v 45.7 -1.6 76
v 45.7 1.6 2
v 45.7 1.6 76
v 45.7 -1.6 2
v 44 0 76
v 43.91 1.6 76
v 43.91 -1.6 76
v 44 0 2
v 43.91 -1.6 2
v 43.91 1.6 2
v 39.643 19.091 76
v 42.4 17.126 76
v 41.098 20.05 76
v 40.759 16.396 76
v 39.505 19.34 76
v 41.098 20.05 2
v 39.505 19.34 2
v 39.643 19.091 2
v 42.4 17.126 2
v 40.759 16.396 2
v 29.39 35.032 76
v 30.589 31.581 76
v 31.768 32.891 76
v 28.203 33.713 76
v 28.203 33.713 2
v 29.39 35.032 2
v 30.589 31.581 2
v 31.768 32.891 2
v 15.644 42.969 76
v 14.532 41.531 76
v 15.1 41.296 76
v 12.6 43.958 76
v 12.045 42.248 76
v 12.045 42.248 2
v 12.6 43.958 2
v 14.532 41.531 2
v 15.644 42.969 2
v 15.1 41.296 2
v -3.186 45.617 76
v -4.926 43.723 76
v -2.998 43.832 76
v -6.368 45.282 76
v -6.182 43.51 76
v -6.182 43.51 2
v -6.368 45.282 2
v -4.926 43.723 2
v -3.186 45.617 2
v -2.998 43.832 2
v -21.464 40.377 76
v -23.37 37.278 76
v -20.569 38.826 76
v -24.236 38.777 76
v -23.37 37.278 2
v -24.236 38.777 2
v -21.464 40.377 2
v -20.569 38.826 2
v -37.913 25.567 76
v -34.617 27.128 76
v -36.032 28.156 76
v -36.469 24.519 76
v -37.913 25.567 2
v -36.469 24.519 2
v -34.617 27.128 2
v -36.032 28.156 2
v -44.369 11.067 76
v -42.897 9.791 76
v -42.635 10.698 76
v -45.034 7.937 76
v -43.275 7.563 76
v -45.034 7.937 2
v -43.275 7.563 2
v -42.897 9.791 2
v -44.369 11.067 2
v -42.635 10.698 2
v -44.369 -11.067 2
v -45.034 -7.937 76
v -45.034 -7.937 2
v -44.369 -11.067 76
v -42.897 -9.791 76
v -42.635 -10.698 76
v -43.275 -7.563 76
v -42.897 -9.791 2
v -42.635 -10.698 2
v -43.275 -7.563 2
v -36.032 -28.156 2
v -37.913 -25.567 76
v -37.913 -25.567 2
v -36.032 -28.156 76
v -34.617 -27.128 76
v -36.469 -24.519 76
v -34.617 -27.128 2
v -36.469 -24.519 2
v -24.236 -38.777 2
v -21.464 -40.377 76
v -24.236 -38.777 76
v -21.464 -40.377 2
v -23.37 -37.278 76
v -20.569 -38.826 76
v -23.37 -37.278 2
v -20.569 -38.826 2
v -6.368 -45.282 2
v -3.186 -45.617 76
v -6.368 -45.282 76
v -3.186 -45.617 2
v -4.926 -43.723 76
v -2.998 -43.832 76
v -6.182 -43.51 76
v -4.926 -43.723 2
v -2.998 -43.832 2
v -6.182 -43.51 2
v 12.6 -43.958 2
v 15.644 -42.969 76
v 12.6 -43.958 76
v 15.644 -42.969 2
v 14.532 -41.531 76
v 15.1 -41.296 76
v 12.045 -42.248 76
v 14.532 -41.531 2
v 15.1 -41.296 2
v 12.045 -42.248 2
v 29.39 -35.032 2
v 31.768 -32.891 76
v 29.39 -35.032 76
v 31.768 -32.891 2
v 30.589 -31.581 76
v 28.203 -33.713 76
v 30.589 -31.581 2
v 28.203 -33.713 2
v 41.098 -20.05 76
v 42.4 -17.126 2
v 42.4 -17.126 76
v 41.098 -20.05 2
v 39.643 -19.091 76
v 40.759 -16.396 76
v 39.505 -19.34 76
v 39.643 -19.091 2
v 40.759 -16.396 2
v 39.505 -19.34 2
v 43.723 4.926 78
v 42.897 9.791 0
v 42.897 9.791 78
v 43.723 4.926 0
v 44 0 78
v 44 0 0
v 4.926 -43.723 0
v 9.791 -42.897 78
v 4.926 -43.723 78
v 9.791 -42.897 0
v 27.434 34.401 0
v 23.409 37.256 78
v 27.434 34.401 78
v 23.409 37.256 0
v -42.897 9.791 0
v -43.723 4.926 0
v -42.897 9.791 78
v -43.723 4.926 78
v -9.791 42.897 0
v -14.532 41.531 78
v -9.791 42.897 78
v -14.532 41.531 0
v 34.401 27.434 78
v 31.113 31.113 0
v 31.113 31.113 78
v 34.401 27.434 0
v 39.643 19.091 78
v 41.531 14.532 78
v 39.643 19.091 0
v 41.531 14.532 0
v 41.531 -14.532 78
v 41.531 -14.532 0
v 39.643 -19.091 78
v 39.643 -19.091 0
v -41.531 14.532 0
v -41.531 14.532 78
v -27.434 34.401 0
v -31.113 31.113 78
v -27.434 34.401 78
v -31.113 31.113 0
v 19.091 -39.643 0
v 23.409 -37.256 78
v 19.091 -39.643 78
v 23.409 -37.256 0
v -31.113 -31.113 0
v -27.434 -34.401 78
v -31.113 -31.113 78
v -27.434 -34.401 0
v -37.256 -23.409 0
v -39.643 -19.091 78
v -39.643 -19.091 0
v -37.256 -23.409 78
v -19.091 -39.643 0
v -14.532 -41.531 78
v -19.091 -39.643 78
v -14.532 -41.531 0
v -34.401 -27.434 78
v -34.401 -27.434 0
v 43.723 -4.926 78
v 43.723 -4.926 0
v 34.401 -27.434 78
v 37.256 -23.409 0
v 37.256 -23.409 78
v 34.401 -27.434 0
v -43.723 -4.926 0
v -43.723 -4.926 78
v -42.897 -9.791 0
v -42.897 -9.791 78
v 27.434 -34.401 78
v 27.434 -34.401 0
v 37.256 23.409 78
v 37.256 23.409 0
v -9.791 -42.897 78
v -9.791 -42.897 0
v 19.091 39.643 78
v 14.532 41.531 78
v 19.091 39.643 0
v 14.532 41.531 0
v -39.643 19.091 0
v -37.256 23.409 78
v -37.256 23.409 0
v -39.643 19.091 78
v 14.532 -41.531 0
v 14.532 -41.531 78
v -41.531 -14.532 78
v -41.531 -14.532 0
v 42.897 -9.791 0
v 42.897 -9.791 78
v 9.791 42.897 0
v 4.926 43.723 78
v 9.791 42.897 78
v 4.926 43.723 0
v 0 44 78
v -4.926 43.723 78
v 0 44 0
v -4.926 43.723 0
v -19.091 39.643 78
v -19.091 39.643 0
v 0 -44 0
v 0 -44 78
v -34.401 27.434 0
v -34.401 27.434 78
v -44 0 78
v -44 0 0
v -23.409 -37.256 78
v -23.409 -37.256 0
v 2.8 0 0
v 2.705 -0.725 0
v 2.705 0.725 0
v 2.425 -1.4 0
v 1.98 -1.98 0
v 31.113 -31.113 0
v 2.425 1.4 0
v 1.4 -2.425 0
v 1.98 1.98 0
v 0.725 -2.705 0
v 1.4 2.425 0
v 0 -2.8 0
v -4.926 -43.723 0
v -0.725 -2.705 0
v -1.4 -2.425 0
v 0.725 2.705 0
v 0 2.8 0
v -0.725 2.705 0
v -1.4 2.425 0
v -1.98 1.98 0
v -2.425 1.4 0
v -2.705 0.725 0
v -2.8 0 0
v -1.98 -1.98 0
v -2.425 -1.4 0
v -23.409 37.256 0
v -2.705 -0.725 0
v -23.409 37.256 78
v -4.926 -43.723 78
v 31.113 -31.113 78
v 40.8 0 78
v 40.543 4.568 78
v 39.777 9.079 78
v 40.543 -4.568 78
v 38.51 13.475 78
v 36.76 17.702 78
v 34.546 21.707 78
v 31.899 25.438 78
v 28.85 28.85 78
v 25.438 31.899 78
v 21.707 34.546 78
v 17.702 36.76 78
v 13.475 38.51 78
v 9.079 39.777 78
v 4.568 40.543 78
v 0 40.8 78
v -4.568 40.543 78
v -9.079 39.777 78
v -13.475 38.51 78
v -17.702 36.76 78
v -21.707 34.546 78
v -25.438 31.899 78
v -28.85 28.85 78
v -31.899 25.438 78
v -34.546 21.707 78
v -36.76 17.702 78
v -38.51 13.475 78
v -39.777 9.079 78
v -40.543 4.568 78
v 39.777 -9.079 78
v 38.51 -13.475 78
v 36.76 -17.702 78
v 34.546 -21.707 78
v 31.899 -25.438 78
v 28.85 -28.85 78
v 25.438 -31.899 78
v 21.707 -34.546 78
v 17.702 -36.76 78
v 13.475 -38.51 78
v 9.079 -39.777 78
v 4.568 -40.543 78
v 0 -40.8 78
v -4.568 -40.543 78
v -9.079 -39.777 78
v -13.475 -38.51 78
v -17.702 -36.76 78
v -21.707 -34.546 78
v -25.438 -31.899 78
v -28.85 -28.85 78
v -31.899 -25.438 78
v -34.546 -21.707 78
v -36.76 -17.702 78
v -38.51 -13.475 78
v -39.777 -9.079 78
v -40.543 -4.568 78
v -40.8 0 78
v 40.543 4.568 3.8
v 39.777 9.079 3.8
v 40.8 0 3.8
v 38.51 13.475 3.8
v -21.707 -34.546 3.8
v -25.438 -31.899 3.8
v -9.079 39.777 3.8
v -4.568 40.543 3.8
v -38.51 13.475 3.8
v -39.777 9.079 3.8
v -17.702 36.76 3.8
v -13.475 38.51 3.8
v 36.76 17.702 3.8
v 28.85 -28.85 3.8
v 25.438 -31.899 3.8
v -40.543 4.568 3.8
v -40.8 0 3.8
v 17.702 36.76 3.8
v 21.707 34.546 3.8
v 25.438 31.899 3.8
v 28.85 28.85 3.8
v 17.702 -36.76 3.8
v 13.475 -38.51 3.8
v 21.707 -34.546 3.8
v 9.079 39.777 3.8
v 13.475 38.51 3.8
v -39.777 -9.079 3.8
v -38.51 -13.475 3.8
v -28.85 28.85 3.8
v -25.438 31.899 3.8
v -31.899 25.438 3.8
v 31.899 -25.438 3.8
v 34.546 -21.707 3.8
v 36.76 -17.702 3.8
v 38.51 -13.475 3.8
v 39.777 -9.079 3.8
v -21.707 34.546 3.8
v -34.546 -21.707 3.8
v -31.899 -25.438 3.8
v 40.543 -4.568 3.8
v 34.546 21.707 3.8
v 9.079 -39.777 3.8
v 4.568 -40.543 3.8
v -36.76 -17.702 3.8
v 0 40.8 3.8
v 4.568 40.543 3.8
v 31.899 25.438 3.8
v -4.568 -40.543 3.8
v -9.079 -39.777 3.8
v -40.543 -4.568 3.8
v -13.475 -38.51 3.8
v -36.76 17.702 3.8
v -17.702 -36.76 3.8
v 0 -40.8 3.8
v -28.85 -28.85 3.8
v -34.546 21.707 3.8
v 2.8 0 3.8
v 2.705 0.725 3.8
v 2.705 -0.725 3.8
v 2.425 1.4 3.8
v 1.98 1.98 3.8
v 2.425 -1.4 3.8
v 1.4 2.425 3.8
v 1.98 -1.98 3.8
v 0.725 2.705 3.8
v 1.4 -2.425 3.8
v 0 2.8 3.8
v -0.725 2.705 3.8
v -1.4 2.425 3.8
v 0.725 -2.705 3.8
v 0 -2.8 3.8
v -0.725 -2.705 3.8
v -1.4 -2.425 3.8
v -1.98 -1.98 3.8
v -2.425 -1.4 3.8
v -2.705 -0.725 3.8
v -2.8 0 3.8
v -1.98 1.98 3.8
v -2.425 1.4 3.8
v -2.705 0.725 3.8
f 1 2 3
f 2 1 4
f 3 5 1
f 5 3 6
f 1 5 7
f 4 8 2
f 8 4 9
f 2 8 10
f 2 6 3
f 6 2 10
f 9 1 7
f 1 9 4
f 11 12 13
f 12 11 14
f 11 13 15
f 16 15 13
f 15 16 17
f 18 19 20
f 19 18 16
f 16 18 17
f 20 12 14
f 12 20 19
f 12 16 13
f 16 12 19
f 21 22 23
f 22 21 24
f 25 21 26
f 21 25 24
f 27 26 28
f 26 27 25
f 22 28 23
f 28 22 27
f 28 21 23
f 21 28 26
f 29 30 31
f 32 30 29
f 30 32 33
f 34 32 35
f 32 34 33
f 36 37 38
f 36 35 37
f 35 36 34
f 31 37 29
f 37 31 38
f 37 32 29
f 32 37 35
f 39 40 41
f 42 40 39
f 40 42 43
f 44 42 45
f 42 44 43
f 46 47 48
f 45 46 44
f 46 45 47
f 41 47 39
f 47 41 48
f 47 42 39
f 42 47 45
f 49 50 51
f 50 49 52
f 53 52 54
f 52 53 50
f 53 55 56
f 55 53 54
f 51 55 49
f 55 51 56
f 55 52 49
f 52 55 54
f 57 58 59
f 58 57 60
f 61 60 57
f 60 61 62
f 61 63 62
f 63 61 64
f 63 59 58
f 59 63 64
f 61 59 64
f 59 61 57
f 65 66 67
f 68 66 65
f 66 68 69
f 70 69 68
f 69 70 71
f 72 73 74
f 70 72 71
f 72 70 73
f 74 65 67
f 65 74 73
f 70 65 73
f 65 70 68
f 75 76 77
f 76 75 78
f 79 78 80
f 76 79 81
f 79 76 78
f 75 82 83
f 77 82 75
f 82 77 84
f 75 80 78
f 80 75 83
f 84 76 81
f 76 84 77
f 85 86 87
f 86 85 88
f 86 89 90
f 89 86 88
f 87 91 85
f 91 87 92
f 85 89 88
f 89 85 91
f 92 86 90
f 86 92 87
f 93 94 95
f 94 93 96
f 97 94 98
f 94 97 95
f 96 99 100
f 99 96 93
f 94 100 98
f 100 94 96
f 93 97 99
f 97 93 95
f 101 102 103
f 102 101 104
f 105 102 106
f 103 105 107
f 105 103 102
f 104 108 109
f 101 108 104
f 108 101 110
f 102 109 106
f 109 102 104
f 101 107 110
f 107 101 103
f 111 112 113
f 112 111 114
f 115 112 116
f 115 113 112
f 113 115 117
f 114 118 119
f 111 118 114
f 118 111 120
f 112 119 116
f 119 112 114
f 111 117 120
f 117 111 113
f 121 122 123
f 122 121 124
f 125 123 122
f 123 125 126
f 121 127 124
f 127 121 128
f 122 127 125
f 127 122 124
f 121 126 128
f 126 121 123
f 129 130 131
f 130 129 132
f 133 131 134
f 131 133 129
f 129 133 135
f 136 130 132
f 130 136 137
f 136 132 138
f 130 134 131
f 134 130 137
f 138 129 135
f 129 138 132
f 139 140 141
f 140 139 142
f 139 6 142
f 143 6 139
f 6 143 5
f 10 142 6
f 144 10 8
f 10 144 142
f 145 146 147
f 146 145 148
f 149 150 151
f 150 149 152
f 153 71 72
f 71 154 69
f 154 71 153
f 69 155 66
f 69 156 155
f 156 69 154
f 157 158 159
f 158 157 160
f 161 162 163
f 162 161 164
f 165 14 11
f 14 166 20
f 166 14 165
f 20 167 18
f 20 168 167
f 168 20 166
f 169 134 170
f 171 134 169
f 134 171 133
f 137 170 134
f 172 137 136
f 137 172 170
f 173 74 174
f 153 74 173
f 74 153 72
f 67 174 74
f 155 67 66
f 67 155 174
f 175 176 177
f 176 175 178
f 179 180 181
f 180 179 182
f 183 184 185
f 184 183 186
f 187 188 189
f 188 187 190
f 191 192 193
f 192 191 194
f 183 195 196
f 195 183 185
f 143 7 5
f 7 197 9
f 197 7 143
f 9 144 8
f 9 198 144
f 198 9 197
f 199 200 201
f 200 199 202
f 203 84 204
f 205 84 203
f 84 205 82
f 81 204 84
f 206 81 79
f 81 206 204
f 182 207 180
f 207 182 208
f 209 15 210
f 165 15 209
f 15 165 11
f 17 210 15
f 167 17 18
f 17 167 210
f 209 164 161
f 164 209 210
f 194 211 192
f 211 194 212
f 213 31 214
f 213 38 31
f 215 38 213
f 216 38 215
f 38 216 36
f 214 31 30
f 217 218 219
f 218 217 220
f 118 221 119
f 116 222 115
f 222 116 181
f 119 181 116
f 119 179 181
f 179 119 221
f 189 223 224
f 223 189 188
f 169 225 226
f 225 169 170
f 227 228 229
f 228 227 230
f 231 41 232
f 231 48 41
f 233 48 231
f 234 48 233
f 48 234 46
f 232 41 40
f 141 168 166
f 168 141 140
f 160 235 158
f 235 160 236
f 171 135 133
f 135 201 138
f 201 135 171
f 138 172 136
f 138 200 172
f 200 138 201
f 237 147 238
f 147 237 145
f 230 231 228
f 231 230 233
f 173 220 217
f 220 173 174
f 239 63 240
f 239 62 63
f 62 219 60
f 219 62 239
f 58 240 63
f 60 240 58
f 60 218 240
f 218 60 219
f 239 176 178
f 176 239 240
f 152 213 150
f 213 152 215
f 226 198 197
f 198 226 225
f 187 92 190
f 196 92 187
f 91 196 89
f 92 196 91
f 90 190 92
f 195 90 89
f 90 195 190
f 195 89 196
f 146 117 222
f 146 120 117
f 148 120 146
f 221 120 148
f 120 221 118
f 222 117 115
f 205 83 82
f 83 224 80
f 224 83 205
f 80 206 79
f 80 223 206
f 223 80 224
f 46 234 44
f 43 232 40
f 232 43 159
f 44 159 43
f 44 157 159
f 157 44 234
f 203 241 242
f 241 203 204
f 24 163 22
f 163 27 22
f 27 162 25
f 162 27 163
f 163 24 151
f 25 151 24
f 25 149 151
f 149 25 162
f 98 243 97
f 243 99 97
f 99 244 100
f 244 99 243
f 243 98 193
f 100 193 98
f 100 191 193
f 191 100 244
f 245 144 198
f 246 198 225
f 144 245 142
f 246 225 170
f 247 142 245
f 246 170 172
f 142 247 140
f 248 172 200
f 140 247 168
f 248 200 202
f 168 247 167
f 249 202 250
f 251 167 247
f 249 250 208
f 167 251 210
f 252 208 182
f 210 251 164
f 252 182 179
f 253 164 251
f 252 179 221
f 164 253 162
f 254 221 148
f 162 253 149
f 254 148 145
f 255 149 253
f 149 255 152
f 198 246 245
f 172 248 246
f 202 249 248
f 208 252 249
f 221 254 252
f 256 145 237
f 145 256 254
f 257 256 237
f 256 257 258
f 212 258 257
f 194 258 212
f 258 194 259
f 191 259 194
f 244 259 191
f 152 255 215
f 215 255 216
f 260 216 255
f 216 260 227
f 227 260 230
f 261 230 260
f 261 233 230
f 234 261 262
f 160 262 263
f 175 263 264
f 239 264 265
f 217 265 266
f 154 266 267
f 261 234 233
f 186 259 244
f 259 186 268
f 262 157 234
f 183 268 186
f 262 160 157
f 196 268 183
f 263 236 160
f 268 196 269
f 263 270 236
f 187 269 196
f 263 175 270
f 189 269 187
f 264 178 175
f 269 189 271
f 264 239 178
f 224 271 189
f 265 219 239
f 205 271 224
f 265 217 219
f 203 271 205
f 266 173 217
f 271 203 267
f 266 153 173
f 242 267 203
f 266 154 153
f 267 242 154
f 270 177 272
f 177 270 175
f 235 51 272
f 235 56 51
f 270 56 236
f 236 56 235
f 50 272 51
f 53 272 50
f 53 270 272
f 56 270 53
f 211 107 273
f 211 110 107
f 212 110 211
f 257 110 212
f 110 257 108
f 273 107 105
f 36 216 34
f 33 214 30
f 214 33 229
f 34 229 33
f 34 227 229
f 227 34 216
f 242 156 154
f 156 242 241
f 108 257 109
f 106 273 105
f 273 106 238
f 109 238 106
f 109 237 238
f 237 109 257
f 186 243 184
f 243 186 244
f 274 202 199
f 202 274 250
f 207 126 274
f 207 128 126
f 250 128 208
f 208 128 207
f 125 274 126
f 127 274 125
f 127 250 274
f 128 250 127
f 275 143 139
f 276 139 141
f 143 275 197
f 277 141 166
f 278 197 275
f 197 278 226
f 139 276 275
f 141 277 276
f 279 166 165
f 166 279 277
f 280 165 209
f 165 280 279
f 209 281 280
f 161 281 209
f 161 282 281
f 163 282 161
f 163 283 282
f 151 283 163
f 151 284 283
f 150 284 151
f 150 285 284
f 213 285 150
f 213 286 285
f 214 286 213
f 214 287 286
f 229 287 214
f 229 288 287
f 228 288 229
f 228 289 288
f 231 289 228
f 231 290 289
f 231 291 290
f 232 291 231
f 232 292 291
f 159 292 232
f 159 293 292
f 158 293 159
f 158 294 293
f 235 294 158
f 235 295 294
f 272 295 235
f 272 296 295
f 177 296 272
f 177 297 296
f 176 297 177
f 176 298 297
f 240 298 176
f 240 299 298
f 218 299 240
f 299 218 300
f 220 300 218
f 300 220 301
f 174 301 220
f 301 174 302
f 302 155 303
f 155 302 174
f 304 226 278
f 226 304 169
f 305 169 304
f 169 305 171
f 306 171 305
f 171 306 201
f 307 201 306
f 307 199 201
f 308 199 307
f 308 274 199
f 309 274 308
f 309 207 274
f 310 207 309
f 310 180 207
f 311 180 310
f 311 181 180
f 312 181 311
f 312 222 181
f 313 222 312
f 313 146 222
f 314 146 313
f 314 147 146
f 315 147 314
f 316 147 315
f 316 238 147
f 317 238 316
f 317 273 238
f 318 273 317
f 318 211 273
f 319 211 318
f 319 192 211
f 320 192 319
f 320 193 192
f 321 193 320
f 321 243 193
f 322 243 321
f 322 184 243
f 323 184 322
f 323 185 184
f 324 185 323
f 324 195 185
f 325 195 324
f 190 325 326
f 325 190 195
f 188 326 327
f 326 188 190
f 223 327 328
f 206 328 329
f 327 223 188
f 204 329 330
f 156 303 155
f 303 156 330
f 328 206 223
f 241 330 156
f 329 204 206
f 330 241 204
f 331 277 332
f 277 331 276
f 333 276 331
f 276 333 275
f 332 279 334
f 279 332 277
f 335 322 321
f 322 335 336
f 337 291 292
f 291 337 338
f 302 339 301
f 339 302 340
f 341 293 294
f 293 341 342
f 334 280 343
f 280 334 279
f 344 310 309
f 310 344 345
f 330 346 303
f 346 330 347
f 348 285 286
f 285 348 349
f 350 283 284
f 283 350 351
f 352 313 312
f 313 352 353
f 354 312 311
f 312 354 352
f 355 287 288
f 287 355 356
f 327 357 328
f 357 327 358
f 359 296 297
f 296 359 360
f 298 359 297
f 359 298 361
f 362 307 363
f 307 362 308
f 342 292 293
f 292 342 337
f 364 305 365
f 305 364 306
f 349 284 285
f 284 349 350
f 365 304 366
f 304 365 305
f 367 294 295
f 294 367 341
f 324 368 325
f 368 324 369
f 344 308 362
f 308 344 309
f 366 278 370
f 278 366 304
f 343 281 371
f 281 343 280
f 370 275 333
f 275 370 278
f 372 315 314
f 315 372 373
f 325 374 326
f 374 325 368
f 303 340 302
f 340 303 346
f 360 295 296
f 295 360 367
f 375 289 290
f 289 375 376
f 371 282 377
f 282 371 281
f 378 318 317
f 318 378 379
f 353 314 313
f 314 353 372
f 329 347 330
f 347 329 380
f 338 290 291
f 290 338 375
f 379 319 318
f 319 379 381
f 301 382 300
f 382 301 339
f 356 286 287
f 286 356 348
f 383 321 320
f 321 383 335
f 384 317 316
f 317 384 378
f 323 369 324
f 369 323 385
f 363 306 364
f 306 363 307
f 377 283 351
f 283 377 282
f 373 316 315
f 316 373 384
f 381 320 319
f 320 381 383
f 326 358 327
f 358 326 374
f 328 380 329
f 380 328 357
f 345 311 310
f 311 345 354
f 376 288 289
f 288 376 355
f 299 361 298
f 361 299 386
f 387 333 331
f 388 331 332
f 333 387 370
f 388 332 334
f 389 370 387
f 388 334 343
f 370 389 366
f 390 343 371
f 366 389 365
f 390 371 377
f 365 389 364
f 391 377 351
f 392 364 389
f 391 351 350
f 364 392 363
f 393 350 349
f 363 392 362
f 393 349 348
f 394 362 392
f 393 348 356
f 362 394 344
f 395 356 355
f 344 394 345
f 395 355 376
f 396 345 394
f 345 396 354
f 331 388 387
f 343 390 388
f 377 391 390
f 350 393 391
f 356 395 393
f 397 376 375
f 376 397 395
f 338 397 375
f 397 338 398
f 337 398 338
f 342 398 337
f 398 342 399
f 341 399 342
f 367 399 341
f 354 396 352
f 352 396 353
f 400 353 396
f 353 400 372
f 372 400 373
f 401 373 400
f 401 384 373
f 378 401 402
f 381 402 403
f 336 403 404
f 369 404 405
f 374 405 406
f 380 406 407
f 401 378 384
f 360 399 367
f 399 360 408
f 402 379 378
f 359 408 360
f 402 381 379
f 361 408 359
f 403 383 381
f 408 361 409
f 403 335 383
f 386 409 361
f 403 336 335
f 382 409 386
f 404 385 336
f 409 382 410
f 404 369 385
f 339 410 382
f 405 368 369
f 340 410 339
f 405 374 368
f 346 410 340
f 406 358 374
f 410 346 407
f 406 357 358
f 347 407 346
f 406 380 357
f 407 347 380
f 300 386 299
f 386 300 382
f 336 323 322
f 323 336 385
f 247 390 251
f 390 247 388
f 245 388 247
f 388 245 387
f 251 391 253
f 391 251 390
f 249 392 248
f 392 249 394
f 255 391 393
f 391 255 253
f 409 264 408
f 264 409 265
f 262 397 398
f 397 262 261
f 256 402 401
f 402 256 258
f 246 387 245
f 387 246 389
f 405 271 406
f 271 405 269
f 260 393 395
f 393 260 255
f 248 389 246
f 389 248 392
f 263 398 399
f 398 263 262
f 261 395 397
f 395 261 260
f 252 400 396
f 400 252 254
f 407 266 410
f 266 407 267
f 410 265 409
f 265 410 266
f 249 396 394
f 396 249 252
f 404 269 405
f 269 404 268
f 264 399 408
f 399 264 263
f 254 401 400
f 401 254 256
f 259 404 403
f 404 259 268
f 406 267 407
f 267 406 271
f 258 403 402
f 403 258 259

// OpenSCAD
// file: lib/commerce_forms.scad
// Original parametric printable prototypes. Dimensions in millimeters.
// CAD is the manufacturing authority; Three.js gallery geometry is a stylized preview.
// No external copyrighted silhouettes, brands, logos or character geometry.
$fn=56;
module market_lantern(v=1) {
  r=27+v*2; h=76+v*6; wall=2.8;
  difference() {
    cylinder(r=r,h=h);
    translate([0,0,-1]) cylinder(r=r-wall,h=h+2);
    for (tier=[0:3], j=[0:7+v]) {
      a=360*j/(8+v)+tier*15;
      rotate([0,0,a])
        translate([r-1,0,17+tier*(h-33)/3])
          rotate([0,90,0]) cylinder(r=2.2+(v%3)*.5,h=10,center=true,$fn=18);
    }
  }
}
module market_figurine(v=1) {
  r=18+v;
  union() {
    cylinder(r=29,h=6);
    translate([0,0,7]) scale([1,0.85,1.15]) sphere(r=r);
    translate([0,0,35]) scale([1,.91,.84]) sphere(r=r*.78);
    for (s=[-1,1]) {
      translate([s*(r*.58),0,49])
        rotate([0,s*13,0]) cylinder(r1=5+v*.4,r2=1,h=10+v*2);
      translate([s*(r*.73),-2,20]) scale([.36,.55,.67]) sphere(r=r*.75);
    }
    translate([0,-r*.62,39]) sphere(r=3.5+v*.2);
    for(s=[-1,1])translate([s*7,-r*.72,43])sphere(r=1.8);
  }
}
module market_scenery(v=1) {
  union() {
    translate([-52,-32,0]) cube([104,64,4]);
    for (i=[0:2+v%2]) {
      x=-40+i*24;
      translate([x, -14+(i%2)*12,3.8])
        cube([15+v*2,19,13+v*3]);
      translate([x+2,-13+(i%2)*12,16+v*3])
        cube([11+v*2,15,3]);
    }
    for(i=[-1,1]) {
      translate([i*42,20,3.8]) cylinder(r=5,h=12+v*4);
      translate([i*42,20,15+v*4]) sphere(r=6);
    }
  }
}
module market_organizer(v=1) {
  w=104+v*5;d=69+v*3;h=32+v*3; columns=2+v%3;
  difference() {
    translate([-w/2,-d/2,0]) cube([w,d,h]);
    for(i=[0:columns-1])
      translate([-w/2+3+i*(w-6)/columns,-d/2+3,4])
        cube([(w-6)/columns-3,d-6,h+3]);
  }
}
module market_display(v=1) {
  union() {
    cylinder(r=34+v*2,h=6);
    translate([0,0,5.8]) cylinder(r1=12+v,r2=9,h=26+v*3);
    translate([0,0,30+v*3]) cylinder(r=25+v,h=5);
    for(s=[-1,1])
      translate([s*(16+v),0,34+v*3])
        cube([5,31,10],center=true);
  }
}
module market_gaming(v=1) {
  w=102+v*5;d=66+v*2; h=22+v*3;
  difference() {
    union() {
      translate([-w/2,-d/2,0]) cube([w,d,h]);
      translate([-w/2, d/2-14,h-1]) cube([w,12,15+v]);
    }
    translate([-w/2+5,-d/2+5,5]) cube([w-10,d-24,h+12]);
    for(i=[-1,0,1])
      translate([i*24,d/2-13,h+6]) rotate([90,0,0])
        cylinder(r=3.6+v*.3,h=16,$fn=22);
  }
}
module market_jewelry(v=1) {
  union() {
    translate([-40,-26,0]) cube([80,52,6]);
    for (i=[0:3+v%2]) {
      x=-29+i*58/(3+v%2);
      translate([x,0,5.8]) cylinder(r=3.2,h=42+v*5,$fn=24);
      translate([x,0,46+v*5]) sphere(r=5);
    }
    translate([-33,-5,42+v*5]) cube([66,9,6]);
    for(i=[0:4])translate([-25+i*12,0,46+v*5])
      cylinder(r1=4,r2=1.5,h=7,$fn=20);
  }
}
module market_planter(v=1) {
  r=34+v*2; h=48+v*6; w=3.2;
  difference() {
    union() {
      cylinder(r=r,h=h);
      for(i=[0:9+v])
        rotate([0,0,360*i/(10+v)])
          translate([r-.5,-1.6,2]) cube([2.2,3.2,h-4]);
    }
    translate([0,0,3.8]) cylinder(r=r-w,h=h+2);
    translate([0,0,-1]) cylinder(r=2.8,h=7,$fn=24);
  }
}
module market_gift(v=1,label="CUSTOM") {
  w=100+v*6;d=49+v*3;
  difference() {
    union() {
      hull()for(x=[-w/2+7,w/2-7],y=[-d/2+7,d/2-7])
        translate([x,y,0]) cylinder(r=7,h=6,$fn=24);
      translate([0,0,5.8]) linear_extrude(height=2.2)
        text(label,size=max(9,18-v),halign="center",valign="center",
             font="Liberation Sans:style=Bold");
    }
    if(v==3)for(x=[-w/2+10,w/2-10])
      translate([x,d/2-10,-1]) cylinder(r=2.5,h=10,$fn=24);
  }
}
module market_cosplay(v=1) {
  r=28+v*2;
  difference() {
    union() {
      cylinder(r=r,h=4.5,$fn=8+v*2);
      for(i=[0:4+v])
        rotate([0,0,360*i/(5+v)])
          translate([r*.45,0,4.2]) cylinder(r=4.2,h=1.8,$fn=6);
      cylinder(r=12+v*.5,h=7,$fn=5+v);
    }
    translate([0,r*.70,-1])cylinder(r=3.3,h=10,$fn=24);
  }
}
module commercial_form(family="lantern",variant=1,label="CUSTOM") {
  if(family=="lantern")market_lantern(variant);
  else if(family=="figurine")market_figurine(variant);
  else if(family=="scenery")market_scenery(variant);
  else if(family=="organizer")market_organizer(variant);
  else if(family=="display")market_display(variant);
  else if(family=="gaming")market_gaming(variant);
  else if(family=="jewelry")market_jewelry(variant);
  else if(family=="planter")market_planter(variant);
  else if(family=="gift")market_gift(variant,label);
  else if(family=="cosplay")market_cosplay(variant);
  else assert(false,str("Unknown family: ",family));
}
// main file
// Original 3D printable CAD prototype for Desktop Herb Planter
// Millimeter units; edit parameters and print-test before commercial shipment.
use <lib/commerce_forms.scad>
commercial_form(family="planter",variant=5);
